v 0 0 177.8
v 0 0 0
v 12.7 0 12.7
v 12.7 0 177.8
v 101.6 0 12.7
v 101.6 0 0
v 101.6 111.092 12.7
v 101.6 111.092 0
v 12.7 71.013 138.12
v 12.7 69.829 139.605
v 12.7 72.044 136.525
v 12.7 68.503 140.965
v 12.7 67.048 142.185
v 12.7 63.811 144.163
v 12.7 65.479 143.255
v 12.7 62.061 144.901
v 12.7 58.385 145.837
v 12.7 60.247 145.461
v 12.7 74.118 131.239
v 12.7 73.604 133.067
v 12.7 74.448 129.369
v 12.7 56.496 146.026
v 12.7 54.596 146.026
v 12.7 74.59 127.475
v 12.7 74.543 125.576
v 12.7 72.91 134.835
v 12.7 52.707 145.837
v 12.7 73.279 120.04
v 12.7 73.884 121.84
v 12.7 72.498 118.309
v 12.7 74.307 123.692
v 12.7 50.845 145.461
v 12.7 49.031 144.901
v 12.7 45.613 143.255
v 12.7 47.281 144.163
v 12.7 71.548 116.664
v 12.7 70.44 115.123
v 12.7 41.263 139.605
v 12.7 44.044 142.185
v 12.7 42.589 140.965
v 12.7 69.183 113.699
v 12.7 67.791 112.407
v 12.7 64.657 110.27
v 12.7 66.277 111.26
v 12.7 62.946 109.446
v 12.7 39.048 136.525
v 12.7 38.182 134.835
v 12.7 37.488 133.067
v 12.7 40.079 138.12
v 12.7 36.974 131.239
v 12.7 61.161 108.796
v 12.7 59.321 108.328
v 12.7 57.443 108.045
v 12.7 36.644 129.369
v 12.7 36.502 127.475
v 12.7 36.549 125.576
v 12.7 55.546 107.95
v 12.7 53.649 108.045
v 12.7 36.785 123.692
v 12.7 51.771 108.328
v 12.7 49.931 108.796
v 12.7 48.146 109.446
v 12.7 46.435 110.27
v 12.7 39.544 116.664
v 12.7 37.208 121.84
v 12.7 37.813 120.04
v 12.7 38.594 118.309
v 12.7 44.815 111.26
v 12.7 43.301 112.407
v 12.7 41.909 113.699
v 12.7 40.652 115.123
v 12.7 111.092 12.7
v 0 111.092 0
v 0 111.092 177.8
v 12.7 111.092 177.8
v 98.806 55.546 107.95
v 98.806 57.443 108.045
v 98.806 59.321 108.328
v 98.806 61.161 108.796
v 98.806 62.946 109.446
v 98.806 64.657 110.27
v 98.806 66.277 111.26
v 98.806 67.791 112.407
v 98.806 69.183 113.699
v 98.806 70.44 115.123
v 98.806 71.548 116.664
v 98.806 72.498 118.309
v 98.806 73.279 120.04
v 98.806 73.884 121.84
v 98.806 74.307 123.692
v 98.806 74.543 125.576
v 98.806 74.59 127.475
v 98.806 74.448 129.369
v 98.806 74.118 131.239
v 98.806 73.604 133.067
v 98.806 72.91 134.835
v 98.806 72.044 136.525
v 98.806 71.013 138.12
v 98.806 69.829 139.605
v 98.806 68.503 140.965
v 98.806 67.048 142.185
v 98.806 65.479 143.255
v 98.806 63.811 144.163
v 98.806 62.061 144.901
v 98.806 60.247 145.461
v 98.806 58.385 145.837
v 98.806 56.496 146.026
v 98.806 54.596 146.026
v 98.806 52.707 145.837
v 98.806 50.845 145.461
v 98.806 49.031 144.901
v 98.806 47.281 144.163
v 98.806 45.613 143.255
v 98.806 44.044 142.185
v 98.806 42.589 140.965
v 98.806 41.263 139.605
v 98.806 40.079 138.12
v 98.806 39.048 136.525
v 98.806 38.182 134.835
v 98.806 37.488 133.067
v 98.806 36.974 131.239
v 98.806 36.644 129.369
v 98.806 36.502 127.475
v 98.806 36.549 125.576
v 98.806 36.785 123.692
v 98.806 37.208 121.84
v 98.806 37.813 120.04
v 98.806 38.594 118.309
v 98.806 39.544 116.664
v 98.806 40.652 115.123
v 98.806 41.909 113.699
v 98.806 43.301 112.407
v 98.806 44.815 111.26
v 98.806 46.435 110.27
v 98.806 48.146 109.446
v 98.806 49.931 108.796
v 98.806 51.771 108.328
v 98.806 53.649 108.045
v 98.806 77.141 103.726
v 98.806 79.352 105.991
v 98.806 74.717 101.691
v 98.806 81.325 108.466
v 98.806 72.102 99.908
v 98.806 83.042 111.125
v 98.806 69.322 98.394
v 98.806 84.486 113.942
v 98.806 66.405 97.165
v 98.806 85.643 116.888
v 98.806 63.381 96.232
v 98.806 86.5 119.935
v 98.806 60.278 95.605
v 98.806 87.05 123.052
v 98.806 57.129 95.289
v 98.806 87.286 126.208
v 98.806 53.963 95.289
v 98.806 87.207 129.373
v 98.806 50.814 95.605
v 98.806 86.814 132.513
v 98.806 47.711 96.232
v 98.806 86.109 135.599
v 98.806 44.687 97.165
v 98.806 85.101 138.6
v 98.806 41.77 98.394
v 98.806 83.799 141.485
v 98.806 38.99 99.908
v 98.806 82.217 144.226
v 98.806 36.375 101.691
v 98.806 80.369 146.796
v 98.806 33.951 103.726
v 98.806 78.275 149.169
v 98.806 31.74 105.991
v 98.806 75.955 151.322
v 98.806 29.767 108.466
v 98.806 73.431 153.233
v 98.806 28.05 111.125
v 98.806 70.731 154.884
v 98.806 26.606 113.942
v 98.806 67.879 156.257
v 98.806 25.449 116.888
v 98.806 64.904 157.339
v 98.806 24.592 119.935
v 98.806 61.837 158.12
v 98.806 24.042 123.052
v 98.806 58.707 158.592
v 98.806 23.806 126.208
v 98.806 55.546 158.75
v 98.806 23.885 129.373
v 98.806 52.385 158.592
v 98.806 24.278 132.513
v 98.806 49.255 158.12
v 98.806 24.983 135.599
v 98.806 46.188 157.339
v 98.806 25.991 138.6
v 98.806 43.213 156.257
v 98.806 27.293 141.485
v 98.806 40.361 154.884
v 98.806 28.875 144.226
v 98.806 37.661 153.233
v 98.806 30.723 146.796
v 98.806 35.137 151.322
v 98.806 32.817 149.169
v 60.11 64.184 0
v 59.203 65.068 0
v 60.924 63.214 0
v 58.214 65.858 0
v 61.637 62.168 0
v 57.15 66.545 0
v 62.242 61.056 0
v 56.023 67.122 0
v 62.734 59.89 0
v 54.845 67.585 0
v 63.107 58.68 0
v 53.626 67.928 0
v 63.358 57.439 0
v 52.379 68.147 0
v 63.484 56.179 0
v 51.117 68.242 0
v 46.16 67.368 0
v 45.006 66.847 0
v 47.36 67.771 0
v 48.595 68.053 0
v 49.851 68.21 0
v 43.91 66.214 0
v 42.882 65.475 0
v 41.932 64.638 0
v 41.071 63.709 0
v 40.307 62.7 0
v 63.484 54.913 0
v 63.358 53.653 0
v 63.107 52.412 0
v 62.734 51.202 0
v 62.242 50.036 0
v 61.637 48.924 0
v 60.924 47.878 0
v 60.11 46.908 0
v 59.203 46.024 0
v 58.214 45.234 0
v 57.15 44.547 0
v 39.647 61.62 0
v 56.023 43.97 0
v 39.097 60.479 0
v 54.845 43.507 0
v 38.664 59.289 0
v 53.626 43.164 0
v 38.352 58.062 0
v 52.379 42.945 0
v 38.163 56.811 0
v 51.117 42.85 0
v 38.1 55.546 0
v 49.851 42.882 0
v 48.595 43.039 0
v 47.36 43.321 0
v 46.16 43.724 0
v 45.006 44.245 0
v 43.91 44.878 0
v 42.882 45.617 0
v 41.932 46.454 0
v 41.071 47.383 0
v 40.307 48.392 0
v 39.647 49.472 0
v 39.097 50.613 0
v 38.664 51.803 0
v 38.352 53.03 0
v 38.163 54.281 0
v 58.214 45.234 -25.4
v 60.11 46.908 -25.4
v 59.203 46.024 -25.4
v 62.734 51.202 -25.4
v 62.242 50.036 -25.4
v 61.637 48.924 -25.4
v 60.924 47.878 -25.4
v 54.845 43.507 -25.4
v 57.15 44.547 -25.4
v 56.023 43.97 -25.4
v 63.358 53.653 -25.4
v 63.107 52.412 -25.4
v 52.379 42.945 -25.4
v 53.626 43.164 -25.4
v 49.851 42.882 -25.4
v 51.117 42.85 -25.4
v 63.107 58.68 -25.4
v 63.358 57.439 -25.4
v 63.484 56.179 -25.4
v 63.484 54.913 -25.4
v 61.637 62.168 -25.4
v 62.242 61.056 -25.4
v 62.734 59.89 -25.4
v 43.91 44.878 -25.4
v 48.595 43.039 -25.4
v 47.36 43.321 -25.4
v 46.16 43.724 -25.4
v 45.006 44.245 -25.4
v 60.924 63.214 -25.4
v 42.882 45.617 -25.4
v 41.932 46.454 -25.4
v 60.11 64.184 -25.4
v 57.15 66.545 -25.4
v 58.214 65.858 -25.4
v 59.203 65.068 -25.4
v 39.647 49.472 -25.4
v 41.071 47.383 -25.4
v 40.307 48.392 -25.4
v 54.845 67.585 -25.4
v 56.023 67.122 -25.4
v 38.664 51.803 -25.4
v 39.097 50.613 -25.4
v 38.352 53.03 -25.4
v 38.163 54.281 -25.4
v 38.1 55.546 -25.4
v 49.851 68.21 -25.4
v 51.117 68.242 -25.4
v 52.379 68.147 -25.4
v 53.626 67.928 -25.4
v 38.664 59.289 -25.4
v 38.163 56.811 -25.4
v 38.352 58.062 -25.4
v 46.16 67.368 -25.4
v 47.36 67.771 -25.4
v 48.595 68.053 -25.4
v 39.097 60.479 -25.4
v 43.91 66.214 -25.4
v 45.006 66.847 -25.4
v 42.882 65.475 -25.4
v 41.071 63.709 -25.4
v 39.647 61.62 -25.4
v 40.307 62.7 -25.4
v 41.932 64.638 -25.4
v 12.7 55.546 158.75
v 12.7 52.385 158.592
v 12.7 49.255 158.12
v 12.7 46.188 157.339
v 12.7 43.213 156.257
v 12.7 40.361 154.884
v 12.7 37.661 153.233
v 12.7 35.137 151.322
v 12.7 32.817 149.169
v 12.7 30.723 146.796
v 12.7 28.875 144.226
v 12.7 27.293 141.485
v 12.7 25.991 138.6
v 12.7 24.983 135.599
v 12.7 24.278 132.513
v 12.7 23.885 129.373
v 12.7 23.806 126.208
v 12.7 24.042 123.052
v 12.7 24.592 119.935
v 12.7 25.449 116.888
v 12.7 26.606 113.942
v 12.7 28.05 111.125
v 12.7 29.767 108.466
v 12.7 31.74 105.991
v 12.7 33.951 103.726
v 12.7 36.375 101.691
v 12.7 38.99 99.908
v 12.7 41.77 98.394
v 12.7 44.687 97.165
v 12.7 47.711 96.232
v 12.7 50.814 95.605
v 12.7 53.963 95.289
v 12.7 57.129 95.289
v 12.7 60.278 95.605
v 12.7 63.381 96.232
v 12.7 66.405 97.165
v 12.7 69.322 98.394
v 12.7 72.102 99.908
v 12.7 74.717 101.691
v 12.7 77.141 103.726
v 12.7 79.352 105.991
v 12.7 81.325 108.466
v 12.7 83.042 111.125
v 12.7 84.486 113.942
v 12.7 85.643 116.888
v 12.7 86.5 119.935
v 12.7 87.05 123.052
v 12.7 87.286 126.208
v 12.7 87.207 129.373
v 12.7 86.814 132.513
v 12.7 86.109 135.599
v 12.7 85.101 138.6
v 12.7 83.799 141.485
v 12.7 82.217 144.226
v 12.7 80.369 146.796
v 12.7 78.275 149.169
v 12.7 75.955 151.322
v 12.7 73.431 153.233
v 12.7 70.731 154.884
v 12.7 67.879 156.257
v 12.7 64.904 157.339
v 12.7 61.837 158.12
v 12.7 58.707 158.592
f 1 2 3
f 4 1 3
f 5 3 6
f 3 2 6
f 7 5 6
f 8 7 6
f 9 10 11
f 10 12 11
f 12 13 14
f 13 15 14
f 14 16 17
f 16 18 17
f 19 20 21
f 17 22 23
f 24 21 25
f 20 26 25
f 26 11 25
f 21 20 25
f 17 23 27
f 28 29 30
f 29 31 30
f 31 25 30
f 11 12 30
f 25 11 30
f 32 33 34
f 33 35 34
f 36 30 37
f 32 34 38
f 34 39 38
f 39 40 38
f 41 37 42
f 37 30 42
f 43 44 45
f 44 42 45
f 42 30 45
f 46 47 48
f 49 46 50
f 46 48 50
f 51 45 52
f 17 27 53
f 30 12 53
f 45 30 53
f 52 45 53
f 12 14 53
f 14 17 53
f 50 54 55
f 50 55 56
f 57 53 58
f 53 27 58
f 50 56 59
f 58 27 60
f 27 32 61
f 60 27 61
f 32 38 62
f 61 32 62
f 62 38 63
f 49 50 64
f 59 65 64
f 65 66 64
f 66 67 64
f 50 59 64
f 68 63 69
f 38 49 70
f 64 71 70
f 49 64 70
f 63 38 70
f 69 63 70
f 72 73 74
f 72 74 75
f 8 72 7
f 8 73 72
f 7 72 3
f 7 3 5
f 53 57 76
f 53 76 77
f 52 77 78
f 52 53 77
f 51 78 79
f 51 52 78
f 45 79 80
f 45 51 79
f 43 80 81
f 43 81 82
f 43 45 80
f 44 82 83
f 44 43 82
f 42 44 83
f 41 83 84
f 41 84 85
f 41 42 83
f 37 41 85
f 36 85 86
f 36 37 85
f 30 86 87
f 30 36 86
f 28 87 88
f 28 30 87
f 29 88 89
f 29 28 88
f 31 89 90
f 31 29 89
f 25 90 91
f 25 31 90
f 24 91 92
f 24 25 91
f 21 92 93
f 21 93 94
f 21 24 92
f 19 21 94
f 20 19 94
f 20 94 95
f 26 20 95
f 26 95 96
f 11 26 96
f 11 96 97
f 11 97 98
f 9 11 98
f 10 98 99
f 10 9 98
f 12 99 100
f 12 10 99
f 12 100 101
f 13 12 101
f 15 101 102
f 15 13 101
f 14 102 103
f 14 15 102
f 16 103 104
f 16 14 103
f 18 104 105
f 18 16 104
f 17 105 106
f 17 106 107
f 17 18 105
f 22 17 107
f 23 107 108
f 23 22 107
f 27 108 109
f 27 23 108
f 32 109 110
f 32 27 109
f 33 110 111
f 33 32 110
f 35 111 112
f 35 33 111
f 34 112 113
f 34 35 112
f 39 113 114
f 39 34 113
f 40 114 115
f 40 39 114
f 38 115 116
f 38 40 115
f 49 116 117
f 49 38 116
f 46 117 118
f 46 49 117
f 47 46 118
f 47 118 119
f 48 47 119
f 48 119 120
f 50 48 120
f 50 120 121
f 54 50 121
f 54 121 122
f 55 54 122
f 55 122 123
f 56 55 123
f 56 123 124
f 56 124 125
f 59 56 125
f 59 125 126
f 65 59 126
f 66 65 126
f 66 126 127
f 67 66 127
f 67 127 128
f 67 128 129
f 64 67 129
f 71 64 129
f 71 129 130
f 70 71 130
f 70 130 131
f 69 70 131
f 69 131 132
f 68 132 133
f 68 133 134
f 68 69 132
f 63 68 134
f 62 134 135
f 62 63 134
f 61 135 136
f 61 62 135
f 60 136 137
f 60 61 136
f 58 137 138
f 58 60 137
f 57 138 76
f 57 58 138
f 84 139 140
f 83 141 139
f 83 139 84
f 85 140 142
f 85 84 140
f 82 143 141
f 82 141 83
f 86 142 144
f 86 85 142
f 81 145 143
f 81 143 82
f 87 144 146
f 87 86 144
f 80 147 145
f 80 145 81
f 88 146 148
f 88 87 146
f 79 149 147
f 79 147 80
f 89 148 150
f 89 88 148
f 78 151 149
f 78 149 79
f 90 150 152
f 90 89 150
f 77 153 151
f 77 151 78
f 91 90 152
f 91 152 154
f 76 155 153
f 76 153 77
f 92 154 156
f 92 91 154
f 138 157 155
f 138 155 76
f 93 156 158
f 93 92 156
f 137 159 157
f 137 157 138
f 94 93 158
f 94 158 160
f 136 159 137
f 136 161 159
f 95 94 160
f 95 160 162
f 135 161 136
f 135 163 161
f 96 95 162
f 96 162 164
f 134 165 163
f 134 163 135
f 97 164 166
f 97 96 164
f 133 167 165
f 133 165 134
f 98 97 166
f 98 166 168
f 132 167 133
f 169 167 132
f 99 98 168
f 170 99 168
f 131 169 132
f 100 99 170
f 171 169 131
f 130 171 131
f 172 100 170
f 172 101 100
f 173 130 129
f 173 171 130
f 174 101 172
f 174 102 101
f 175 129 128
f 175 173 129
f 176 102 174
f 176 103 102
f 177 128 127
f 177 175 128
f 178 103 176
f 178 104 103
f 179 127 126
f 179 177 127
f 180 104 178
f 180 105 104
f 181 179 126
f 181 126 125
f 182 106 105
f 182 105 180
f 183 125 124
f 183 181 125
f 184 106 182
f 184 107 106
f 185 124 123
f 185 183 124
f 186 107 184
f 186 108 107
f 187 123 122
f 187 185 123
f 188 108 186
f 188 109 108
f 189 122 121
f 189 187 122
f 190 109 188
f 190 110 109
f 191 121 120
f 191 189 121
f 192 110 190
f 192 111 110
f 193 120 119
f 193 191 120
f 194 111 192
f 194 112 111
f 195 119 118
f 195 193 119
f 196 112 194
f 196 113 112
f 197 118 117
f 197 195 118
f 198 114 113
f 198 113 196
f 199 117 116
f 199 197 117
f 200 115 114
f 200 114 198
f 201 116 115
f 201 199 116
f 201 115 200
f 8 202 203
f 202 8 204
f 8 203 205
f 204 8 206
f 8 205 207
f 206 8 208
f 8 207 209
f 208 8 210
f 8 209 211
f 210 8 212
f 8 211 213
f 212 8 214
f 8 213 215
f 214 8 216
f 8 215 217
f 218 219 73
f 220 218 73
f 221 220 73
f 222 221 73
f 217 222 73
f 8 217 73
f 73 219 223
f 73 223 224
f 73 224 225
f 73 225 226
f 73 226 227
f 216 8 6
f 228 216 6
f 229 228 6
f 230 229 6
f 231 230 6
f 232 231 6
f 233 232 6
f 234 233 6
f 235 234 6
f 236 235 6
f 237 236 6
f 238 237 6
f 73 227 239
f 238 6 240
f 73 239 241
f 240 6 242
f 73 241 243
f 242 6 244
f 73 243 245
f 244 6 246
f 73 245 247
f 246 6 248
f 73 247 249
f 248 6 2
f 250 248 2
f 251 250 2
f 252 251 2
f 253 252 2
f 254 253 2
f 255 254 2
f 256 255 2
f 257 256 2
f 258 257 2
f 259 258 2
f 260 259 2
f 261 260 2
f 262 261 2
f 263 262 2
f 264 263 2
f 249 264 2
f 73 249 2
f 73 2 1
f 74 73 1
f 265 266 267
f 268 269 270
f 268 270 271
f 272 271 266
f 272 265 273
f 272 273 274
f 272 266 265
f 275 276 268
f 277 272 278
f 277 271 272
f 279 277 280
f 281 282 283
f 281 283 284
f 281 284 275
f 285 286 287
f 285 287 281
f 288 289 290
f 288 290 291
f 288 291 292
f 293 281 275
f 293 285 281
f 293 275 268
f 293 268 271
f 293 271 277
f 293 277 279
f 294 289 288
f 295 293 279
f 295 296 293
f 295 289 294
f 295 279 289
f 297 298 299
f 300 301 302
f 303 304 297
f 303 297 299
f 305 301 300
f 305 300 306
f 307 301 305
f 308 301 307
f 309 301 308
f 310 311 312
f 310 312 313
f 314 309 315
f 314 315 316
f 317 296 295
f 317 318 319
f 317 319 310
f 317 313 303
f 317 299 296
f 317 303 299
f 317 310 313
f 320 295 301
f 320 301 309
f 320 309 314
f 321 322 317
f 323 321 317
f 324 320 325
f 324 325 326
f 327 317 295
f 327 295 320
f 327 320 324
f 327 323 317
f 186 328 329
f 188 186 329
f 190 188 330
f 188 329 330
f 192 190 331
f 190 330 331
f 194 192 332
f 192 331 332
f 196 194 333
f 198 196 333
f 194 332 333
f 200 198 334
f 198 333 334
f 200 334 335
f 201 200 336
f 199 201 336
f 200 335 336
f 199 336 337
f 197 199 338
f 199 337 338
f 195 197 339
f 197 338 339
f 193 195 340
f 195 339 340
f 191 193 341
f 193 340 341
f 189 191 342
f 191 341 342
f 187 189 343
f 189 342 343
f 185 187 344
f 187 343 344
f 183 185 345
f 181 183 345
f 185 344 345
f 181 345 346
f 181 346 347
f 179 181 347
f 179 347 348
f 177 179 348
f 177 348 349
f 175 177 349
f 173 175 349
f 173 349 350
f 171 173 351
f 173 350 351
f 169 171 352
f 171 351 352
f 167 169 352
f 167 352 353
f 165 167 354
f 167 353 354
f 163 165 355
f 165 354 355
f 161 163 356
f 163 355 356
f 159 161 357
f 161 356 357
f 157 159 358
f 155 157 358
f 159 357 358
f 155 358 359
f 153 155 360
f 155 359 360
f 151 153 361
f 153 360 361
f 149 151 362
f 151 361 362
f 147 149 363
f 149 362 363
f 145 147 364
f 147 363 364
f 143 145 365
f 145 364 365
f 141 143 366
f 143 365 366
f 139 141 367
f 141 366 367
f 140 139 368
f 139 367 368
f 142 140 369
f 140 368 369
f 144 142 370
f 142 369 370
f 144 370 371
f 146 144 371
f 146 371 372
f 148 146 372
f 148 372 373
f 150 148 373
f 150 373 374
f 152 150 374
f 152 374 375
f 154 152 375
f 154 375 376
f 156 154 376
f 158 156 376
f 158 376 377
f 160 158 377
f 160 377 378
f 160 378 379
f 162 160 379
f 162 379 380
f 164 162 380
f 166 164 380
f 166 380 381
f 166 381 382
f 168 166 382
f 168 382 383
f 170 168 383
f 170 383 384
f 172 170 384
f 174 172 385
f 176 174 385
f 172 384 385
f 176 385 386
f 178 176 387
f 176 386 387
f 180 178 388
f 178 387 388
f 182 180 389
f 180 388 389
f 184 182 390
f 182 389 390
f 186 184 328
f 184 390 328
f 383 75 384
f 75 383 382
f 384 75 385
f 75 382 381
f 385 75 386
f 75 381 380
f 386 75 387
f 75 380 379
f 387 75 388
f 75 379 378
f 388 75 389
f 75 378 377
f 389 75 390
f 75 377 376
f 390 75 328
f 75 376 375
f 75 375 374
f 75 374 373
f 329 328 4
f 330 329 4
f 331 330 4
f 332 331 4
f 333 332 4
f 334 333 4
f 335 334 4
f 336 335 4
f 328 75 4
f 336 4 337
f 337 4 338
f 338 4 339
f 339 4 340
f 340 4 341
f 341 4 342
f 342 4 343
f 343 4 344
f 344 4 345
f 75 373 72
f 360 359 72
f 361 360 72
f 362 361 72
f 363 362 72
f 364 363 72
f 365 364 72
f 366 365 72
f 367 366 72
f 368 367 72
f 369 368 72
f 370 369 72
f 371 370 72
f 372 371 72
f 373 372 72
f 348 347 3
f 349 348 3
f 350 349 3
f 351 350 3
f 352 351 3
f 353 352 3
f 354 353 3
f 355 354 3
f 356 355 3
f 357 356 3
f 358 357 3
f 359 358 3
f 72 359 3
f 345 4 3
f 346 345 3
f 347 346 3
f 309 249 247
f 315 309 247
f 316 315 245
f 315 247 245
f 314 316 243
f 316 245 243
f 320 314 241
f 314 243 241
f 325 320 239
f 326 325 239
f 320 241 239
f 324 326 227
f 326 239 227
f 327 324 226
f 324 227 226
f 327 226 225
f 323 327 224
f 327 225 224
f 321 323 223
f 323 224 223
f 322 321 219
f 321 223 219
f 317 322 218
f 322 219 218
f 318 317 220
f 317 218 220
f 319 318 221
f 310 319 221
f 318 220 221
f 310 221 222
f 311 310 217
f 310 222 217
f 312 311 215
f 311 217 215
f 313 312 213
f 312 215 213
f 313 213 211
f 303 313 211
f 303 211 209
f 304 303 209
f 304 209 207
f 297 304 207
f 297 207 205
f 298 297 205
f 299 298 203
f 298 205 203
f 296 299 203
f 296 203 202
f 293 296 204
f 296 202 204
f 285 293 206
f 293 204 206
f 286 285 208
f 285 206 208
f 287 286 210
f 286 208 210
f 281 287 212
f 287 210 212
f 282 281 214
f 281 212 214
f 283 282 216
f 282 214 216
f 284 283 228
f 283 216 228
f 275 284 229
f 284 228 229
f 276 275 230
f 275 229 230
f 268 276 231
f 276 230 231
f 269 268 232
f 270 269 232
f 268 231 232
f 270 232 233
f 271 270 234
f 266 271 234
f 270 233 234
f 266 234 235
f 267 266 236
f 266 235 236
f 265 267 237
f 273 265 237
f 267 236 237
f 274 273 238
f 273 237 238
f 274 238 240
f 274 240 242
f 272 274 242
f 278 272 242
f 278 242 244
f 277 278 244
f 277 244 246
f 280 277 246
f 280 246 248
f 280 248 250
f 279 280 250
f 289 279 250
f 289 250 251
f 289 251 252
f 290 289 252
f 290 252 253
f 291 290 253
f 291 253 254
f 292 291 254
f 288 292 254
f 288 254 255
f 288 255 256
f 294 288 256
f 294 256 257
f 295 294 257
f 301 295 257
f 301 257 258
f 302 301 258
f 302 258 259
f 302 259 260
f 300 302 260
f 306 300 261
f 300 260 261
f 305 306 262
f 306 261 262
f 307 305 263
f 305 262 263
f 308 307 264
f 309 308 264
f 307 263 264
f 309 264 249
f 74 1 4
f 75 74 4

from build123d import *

# Parameters (mm, degrees)
BOSS_EXTRUDE1_DEPTH = 111.092
SKETCH3_R           = 12.7
BOSS_EXTRUDE2_DEPTH = 25.4
SKETCH4_R           = 31.75
SKETCH4_R_2         = 19.05
BOSS_EXTRUDE3_DEPTH = 86.106


with BuildPart() as part:
    # Sketch2 → Boss-Extrude1 (new body)
    with BuildSketch(Plane(origin=(0, 0, 0), x_dir=(1, 0, 0), z_dir=(0, 1, 0))):
        Polygon((101.6, 0), (0, 0), (0, -177.8), (12.7, -177.8), (12.7, -12.7), (101.6, -12.7), align=None)
    extrude(amount=BOSS_EXTRUDE1_DEPTH)

    # Sketch3 → Boss-Extrude2 (add)
    with BuildSketch(Plane(origin=(0, 0, 0), x_dir=(-1, 0, 0), z_dir=(0, 0, -1))):
        with Locations((-50.8, 55.546)):
            Circle(SKETCH3_R)
    extrude(amount=BOSS_EXTRUDE2_DEPTH)

    # Sketch4 → Boss-Extrude3 (add)
    with BuildSketch(Plane(origin=(12.7, 0, 0), x_dir=(0, 0, -1), z_dir=(1, 0, 0))):
        with Locations(Location((-127, 55.546, 0), (0, 0, 180))):
            Circle(SKETCH4_R)
        with Locations((-127, 55.546)):
            Circle(SKETCH4_R_2, mode=Mode.SUBTRACT)
    extrude(amount=BOSS_EXTRUDE3_DEPTH)


solid = part.part
